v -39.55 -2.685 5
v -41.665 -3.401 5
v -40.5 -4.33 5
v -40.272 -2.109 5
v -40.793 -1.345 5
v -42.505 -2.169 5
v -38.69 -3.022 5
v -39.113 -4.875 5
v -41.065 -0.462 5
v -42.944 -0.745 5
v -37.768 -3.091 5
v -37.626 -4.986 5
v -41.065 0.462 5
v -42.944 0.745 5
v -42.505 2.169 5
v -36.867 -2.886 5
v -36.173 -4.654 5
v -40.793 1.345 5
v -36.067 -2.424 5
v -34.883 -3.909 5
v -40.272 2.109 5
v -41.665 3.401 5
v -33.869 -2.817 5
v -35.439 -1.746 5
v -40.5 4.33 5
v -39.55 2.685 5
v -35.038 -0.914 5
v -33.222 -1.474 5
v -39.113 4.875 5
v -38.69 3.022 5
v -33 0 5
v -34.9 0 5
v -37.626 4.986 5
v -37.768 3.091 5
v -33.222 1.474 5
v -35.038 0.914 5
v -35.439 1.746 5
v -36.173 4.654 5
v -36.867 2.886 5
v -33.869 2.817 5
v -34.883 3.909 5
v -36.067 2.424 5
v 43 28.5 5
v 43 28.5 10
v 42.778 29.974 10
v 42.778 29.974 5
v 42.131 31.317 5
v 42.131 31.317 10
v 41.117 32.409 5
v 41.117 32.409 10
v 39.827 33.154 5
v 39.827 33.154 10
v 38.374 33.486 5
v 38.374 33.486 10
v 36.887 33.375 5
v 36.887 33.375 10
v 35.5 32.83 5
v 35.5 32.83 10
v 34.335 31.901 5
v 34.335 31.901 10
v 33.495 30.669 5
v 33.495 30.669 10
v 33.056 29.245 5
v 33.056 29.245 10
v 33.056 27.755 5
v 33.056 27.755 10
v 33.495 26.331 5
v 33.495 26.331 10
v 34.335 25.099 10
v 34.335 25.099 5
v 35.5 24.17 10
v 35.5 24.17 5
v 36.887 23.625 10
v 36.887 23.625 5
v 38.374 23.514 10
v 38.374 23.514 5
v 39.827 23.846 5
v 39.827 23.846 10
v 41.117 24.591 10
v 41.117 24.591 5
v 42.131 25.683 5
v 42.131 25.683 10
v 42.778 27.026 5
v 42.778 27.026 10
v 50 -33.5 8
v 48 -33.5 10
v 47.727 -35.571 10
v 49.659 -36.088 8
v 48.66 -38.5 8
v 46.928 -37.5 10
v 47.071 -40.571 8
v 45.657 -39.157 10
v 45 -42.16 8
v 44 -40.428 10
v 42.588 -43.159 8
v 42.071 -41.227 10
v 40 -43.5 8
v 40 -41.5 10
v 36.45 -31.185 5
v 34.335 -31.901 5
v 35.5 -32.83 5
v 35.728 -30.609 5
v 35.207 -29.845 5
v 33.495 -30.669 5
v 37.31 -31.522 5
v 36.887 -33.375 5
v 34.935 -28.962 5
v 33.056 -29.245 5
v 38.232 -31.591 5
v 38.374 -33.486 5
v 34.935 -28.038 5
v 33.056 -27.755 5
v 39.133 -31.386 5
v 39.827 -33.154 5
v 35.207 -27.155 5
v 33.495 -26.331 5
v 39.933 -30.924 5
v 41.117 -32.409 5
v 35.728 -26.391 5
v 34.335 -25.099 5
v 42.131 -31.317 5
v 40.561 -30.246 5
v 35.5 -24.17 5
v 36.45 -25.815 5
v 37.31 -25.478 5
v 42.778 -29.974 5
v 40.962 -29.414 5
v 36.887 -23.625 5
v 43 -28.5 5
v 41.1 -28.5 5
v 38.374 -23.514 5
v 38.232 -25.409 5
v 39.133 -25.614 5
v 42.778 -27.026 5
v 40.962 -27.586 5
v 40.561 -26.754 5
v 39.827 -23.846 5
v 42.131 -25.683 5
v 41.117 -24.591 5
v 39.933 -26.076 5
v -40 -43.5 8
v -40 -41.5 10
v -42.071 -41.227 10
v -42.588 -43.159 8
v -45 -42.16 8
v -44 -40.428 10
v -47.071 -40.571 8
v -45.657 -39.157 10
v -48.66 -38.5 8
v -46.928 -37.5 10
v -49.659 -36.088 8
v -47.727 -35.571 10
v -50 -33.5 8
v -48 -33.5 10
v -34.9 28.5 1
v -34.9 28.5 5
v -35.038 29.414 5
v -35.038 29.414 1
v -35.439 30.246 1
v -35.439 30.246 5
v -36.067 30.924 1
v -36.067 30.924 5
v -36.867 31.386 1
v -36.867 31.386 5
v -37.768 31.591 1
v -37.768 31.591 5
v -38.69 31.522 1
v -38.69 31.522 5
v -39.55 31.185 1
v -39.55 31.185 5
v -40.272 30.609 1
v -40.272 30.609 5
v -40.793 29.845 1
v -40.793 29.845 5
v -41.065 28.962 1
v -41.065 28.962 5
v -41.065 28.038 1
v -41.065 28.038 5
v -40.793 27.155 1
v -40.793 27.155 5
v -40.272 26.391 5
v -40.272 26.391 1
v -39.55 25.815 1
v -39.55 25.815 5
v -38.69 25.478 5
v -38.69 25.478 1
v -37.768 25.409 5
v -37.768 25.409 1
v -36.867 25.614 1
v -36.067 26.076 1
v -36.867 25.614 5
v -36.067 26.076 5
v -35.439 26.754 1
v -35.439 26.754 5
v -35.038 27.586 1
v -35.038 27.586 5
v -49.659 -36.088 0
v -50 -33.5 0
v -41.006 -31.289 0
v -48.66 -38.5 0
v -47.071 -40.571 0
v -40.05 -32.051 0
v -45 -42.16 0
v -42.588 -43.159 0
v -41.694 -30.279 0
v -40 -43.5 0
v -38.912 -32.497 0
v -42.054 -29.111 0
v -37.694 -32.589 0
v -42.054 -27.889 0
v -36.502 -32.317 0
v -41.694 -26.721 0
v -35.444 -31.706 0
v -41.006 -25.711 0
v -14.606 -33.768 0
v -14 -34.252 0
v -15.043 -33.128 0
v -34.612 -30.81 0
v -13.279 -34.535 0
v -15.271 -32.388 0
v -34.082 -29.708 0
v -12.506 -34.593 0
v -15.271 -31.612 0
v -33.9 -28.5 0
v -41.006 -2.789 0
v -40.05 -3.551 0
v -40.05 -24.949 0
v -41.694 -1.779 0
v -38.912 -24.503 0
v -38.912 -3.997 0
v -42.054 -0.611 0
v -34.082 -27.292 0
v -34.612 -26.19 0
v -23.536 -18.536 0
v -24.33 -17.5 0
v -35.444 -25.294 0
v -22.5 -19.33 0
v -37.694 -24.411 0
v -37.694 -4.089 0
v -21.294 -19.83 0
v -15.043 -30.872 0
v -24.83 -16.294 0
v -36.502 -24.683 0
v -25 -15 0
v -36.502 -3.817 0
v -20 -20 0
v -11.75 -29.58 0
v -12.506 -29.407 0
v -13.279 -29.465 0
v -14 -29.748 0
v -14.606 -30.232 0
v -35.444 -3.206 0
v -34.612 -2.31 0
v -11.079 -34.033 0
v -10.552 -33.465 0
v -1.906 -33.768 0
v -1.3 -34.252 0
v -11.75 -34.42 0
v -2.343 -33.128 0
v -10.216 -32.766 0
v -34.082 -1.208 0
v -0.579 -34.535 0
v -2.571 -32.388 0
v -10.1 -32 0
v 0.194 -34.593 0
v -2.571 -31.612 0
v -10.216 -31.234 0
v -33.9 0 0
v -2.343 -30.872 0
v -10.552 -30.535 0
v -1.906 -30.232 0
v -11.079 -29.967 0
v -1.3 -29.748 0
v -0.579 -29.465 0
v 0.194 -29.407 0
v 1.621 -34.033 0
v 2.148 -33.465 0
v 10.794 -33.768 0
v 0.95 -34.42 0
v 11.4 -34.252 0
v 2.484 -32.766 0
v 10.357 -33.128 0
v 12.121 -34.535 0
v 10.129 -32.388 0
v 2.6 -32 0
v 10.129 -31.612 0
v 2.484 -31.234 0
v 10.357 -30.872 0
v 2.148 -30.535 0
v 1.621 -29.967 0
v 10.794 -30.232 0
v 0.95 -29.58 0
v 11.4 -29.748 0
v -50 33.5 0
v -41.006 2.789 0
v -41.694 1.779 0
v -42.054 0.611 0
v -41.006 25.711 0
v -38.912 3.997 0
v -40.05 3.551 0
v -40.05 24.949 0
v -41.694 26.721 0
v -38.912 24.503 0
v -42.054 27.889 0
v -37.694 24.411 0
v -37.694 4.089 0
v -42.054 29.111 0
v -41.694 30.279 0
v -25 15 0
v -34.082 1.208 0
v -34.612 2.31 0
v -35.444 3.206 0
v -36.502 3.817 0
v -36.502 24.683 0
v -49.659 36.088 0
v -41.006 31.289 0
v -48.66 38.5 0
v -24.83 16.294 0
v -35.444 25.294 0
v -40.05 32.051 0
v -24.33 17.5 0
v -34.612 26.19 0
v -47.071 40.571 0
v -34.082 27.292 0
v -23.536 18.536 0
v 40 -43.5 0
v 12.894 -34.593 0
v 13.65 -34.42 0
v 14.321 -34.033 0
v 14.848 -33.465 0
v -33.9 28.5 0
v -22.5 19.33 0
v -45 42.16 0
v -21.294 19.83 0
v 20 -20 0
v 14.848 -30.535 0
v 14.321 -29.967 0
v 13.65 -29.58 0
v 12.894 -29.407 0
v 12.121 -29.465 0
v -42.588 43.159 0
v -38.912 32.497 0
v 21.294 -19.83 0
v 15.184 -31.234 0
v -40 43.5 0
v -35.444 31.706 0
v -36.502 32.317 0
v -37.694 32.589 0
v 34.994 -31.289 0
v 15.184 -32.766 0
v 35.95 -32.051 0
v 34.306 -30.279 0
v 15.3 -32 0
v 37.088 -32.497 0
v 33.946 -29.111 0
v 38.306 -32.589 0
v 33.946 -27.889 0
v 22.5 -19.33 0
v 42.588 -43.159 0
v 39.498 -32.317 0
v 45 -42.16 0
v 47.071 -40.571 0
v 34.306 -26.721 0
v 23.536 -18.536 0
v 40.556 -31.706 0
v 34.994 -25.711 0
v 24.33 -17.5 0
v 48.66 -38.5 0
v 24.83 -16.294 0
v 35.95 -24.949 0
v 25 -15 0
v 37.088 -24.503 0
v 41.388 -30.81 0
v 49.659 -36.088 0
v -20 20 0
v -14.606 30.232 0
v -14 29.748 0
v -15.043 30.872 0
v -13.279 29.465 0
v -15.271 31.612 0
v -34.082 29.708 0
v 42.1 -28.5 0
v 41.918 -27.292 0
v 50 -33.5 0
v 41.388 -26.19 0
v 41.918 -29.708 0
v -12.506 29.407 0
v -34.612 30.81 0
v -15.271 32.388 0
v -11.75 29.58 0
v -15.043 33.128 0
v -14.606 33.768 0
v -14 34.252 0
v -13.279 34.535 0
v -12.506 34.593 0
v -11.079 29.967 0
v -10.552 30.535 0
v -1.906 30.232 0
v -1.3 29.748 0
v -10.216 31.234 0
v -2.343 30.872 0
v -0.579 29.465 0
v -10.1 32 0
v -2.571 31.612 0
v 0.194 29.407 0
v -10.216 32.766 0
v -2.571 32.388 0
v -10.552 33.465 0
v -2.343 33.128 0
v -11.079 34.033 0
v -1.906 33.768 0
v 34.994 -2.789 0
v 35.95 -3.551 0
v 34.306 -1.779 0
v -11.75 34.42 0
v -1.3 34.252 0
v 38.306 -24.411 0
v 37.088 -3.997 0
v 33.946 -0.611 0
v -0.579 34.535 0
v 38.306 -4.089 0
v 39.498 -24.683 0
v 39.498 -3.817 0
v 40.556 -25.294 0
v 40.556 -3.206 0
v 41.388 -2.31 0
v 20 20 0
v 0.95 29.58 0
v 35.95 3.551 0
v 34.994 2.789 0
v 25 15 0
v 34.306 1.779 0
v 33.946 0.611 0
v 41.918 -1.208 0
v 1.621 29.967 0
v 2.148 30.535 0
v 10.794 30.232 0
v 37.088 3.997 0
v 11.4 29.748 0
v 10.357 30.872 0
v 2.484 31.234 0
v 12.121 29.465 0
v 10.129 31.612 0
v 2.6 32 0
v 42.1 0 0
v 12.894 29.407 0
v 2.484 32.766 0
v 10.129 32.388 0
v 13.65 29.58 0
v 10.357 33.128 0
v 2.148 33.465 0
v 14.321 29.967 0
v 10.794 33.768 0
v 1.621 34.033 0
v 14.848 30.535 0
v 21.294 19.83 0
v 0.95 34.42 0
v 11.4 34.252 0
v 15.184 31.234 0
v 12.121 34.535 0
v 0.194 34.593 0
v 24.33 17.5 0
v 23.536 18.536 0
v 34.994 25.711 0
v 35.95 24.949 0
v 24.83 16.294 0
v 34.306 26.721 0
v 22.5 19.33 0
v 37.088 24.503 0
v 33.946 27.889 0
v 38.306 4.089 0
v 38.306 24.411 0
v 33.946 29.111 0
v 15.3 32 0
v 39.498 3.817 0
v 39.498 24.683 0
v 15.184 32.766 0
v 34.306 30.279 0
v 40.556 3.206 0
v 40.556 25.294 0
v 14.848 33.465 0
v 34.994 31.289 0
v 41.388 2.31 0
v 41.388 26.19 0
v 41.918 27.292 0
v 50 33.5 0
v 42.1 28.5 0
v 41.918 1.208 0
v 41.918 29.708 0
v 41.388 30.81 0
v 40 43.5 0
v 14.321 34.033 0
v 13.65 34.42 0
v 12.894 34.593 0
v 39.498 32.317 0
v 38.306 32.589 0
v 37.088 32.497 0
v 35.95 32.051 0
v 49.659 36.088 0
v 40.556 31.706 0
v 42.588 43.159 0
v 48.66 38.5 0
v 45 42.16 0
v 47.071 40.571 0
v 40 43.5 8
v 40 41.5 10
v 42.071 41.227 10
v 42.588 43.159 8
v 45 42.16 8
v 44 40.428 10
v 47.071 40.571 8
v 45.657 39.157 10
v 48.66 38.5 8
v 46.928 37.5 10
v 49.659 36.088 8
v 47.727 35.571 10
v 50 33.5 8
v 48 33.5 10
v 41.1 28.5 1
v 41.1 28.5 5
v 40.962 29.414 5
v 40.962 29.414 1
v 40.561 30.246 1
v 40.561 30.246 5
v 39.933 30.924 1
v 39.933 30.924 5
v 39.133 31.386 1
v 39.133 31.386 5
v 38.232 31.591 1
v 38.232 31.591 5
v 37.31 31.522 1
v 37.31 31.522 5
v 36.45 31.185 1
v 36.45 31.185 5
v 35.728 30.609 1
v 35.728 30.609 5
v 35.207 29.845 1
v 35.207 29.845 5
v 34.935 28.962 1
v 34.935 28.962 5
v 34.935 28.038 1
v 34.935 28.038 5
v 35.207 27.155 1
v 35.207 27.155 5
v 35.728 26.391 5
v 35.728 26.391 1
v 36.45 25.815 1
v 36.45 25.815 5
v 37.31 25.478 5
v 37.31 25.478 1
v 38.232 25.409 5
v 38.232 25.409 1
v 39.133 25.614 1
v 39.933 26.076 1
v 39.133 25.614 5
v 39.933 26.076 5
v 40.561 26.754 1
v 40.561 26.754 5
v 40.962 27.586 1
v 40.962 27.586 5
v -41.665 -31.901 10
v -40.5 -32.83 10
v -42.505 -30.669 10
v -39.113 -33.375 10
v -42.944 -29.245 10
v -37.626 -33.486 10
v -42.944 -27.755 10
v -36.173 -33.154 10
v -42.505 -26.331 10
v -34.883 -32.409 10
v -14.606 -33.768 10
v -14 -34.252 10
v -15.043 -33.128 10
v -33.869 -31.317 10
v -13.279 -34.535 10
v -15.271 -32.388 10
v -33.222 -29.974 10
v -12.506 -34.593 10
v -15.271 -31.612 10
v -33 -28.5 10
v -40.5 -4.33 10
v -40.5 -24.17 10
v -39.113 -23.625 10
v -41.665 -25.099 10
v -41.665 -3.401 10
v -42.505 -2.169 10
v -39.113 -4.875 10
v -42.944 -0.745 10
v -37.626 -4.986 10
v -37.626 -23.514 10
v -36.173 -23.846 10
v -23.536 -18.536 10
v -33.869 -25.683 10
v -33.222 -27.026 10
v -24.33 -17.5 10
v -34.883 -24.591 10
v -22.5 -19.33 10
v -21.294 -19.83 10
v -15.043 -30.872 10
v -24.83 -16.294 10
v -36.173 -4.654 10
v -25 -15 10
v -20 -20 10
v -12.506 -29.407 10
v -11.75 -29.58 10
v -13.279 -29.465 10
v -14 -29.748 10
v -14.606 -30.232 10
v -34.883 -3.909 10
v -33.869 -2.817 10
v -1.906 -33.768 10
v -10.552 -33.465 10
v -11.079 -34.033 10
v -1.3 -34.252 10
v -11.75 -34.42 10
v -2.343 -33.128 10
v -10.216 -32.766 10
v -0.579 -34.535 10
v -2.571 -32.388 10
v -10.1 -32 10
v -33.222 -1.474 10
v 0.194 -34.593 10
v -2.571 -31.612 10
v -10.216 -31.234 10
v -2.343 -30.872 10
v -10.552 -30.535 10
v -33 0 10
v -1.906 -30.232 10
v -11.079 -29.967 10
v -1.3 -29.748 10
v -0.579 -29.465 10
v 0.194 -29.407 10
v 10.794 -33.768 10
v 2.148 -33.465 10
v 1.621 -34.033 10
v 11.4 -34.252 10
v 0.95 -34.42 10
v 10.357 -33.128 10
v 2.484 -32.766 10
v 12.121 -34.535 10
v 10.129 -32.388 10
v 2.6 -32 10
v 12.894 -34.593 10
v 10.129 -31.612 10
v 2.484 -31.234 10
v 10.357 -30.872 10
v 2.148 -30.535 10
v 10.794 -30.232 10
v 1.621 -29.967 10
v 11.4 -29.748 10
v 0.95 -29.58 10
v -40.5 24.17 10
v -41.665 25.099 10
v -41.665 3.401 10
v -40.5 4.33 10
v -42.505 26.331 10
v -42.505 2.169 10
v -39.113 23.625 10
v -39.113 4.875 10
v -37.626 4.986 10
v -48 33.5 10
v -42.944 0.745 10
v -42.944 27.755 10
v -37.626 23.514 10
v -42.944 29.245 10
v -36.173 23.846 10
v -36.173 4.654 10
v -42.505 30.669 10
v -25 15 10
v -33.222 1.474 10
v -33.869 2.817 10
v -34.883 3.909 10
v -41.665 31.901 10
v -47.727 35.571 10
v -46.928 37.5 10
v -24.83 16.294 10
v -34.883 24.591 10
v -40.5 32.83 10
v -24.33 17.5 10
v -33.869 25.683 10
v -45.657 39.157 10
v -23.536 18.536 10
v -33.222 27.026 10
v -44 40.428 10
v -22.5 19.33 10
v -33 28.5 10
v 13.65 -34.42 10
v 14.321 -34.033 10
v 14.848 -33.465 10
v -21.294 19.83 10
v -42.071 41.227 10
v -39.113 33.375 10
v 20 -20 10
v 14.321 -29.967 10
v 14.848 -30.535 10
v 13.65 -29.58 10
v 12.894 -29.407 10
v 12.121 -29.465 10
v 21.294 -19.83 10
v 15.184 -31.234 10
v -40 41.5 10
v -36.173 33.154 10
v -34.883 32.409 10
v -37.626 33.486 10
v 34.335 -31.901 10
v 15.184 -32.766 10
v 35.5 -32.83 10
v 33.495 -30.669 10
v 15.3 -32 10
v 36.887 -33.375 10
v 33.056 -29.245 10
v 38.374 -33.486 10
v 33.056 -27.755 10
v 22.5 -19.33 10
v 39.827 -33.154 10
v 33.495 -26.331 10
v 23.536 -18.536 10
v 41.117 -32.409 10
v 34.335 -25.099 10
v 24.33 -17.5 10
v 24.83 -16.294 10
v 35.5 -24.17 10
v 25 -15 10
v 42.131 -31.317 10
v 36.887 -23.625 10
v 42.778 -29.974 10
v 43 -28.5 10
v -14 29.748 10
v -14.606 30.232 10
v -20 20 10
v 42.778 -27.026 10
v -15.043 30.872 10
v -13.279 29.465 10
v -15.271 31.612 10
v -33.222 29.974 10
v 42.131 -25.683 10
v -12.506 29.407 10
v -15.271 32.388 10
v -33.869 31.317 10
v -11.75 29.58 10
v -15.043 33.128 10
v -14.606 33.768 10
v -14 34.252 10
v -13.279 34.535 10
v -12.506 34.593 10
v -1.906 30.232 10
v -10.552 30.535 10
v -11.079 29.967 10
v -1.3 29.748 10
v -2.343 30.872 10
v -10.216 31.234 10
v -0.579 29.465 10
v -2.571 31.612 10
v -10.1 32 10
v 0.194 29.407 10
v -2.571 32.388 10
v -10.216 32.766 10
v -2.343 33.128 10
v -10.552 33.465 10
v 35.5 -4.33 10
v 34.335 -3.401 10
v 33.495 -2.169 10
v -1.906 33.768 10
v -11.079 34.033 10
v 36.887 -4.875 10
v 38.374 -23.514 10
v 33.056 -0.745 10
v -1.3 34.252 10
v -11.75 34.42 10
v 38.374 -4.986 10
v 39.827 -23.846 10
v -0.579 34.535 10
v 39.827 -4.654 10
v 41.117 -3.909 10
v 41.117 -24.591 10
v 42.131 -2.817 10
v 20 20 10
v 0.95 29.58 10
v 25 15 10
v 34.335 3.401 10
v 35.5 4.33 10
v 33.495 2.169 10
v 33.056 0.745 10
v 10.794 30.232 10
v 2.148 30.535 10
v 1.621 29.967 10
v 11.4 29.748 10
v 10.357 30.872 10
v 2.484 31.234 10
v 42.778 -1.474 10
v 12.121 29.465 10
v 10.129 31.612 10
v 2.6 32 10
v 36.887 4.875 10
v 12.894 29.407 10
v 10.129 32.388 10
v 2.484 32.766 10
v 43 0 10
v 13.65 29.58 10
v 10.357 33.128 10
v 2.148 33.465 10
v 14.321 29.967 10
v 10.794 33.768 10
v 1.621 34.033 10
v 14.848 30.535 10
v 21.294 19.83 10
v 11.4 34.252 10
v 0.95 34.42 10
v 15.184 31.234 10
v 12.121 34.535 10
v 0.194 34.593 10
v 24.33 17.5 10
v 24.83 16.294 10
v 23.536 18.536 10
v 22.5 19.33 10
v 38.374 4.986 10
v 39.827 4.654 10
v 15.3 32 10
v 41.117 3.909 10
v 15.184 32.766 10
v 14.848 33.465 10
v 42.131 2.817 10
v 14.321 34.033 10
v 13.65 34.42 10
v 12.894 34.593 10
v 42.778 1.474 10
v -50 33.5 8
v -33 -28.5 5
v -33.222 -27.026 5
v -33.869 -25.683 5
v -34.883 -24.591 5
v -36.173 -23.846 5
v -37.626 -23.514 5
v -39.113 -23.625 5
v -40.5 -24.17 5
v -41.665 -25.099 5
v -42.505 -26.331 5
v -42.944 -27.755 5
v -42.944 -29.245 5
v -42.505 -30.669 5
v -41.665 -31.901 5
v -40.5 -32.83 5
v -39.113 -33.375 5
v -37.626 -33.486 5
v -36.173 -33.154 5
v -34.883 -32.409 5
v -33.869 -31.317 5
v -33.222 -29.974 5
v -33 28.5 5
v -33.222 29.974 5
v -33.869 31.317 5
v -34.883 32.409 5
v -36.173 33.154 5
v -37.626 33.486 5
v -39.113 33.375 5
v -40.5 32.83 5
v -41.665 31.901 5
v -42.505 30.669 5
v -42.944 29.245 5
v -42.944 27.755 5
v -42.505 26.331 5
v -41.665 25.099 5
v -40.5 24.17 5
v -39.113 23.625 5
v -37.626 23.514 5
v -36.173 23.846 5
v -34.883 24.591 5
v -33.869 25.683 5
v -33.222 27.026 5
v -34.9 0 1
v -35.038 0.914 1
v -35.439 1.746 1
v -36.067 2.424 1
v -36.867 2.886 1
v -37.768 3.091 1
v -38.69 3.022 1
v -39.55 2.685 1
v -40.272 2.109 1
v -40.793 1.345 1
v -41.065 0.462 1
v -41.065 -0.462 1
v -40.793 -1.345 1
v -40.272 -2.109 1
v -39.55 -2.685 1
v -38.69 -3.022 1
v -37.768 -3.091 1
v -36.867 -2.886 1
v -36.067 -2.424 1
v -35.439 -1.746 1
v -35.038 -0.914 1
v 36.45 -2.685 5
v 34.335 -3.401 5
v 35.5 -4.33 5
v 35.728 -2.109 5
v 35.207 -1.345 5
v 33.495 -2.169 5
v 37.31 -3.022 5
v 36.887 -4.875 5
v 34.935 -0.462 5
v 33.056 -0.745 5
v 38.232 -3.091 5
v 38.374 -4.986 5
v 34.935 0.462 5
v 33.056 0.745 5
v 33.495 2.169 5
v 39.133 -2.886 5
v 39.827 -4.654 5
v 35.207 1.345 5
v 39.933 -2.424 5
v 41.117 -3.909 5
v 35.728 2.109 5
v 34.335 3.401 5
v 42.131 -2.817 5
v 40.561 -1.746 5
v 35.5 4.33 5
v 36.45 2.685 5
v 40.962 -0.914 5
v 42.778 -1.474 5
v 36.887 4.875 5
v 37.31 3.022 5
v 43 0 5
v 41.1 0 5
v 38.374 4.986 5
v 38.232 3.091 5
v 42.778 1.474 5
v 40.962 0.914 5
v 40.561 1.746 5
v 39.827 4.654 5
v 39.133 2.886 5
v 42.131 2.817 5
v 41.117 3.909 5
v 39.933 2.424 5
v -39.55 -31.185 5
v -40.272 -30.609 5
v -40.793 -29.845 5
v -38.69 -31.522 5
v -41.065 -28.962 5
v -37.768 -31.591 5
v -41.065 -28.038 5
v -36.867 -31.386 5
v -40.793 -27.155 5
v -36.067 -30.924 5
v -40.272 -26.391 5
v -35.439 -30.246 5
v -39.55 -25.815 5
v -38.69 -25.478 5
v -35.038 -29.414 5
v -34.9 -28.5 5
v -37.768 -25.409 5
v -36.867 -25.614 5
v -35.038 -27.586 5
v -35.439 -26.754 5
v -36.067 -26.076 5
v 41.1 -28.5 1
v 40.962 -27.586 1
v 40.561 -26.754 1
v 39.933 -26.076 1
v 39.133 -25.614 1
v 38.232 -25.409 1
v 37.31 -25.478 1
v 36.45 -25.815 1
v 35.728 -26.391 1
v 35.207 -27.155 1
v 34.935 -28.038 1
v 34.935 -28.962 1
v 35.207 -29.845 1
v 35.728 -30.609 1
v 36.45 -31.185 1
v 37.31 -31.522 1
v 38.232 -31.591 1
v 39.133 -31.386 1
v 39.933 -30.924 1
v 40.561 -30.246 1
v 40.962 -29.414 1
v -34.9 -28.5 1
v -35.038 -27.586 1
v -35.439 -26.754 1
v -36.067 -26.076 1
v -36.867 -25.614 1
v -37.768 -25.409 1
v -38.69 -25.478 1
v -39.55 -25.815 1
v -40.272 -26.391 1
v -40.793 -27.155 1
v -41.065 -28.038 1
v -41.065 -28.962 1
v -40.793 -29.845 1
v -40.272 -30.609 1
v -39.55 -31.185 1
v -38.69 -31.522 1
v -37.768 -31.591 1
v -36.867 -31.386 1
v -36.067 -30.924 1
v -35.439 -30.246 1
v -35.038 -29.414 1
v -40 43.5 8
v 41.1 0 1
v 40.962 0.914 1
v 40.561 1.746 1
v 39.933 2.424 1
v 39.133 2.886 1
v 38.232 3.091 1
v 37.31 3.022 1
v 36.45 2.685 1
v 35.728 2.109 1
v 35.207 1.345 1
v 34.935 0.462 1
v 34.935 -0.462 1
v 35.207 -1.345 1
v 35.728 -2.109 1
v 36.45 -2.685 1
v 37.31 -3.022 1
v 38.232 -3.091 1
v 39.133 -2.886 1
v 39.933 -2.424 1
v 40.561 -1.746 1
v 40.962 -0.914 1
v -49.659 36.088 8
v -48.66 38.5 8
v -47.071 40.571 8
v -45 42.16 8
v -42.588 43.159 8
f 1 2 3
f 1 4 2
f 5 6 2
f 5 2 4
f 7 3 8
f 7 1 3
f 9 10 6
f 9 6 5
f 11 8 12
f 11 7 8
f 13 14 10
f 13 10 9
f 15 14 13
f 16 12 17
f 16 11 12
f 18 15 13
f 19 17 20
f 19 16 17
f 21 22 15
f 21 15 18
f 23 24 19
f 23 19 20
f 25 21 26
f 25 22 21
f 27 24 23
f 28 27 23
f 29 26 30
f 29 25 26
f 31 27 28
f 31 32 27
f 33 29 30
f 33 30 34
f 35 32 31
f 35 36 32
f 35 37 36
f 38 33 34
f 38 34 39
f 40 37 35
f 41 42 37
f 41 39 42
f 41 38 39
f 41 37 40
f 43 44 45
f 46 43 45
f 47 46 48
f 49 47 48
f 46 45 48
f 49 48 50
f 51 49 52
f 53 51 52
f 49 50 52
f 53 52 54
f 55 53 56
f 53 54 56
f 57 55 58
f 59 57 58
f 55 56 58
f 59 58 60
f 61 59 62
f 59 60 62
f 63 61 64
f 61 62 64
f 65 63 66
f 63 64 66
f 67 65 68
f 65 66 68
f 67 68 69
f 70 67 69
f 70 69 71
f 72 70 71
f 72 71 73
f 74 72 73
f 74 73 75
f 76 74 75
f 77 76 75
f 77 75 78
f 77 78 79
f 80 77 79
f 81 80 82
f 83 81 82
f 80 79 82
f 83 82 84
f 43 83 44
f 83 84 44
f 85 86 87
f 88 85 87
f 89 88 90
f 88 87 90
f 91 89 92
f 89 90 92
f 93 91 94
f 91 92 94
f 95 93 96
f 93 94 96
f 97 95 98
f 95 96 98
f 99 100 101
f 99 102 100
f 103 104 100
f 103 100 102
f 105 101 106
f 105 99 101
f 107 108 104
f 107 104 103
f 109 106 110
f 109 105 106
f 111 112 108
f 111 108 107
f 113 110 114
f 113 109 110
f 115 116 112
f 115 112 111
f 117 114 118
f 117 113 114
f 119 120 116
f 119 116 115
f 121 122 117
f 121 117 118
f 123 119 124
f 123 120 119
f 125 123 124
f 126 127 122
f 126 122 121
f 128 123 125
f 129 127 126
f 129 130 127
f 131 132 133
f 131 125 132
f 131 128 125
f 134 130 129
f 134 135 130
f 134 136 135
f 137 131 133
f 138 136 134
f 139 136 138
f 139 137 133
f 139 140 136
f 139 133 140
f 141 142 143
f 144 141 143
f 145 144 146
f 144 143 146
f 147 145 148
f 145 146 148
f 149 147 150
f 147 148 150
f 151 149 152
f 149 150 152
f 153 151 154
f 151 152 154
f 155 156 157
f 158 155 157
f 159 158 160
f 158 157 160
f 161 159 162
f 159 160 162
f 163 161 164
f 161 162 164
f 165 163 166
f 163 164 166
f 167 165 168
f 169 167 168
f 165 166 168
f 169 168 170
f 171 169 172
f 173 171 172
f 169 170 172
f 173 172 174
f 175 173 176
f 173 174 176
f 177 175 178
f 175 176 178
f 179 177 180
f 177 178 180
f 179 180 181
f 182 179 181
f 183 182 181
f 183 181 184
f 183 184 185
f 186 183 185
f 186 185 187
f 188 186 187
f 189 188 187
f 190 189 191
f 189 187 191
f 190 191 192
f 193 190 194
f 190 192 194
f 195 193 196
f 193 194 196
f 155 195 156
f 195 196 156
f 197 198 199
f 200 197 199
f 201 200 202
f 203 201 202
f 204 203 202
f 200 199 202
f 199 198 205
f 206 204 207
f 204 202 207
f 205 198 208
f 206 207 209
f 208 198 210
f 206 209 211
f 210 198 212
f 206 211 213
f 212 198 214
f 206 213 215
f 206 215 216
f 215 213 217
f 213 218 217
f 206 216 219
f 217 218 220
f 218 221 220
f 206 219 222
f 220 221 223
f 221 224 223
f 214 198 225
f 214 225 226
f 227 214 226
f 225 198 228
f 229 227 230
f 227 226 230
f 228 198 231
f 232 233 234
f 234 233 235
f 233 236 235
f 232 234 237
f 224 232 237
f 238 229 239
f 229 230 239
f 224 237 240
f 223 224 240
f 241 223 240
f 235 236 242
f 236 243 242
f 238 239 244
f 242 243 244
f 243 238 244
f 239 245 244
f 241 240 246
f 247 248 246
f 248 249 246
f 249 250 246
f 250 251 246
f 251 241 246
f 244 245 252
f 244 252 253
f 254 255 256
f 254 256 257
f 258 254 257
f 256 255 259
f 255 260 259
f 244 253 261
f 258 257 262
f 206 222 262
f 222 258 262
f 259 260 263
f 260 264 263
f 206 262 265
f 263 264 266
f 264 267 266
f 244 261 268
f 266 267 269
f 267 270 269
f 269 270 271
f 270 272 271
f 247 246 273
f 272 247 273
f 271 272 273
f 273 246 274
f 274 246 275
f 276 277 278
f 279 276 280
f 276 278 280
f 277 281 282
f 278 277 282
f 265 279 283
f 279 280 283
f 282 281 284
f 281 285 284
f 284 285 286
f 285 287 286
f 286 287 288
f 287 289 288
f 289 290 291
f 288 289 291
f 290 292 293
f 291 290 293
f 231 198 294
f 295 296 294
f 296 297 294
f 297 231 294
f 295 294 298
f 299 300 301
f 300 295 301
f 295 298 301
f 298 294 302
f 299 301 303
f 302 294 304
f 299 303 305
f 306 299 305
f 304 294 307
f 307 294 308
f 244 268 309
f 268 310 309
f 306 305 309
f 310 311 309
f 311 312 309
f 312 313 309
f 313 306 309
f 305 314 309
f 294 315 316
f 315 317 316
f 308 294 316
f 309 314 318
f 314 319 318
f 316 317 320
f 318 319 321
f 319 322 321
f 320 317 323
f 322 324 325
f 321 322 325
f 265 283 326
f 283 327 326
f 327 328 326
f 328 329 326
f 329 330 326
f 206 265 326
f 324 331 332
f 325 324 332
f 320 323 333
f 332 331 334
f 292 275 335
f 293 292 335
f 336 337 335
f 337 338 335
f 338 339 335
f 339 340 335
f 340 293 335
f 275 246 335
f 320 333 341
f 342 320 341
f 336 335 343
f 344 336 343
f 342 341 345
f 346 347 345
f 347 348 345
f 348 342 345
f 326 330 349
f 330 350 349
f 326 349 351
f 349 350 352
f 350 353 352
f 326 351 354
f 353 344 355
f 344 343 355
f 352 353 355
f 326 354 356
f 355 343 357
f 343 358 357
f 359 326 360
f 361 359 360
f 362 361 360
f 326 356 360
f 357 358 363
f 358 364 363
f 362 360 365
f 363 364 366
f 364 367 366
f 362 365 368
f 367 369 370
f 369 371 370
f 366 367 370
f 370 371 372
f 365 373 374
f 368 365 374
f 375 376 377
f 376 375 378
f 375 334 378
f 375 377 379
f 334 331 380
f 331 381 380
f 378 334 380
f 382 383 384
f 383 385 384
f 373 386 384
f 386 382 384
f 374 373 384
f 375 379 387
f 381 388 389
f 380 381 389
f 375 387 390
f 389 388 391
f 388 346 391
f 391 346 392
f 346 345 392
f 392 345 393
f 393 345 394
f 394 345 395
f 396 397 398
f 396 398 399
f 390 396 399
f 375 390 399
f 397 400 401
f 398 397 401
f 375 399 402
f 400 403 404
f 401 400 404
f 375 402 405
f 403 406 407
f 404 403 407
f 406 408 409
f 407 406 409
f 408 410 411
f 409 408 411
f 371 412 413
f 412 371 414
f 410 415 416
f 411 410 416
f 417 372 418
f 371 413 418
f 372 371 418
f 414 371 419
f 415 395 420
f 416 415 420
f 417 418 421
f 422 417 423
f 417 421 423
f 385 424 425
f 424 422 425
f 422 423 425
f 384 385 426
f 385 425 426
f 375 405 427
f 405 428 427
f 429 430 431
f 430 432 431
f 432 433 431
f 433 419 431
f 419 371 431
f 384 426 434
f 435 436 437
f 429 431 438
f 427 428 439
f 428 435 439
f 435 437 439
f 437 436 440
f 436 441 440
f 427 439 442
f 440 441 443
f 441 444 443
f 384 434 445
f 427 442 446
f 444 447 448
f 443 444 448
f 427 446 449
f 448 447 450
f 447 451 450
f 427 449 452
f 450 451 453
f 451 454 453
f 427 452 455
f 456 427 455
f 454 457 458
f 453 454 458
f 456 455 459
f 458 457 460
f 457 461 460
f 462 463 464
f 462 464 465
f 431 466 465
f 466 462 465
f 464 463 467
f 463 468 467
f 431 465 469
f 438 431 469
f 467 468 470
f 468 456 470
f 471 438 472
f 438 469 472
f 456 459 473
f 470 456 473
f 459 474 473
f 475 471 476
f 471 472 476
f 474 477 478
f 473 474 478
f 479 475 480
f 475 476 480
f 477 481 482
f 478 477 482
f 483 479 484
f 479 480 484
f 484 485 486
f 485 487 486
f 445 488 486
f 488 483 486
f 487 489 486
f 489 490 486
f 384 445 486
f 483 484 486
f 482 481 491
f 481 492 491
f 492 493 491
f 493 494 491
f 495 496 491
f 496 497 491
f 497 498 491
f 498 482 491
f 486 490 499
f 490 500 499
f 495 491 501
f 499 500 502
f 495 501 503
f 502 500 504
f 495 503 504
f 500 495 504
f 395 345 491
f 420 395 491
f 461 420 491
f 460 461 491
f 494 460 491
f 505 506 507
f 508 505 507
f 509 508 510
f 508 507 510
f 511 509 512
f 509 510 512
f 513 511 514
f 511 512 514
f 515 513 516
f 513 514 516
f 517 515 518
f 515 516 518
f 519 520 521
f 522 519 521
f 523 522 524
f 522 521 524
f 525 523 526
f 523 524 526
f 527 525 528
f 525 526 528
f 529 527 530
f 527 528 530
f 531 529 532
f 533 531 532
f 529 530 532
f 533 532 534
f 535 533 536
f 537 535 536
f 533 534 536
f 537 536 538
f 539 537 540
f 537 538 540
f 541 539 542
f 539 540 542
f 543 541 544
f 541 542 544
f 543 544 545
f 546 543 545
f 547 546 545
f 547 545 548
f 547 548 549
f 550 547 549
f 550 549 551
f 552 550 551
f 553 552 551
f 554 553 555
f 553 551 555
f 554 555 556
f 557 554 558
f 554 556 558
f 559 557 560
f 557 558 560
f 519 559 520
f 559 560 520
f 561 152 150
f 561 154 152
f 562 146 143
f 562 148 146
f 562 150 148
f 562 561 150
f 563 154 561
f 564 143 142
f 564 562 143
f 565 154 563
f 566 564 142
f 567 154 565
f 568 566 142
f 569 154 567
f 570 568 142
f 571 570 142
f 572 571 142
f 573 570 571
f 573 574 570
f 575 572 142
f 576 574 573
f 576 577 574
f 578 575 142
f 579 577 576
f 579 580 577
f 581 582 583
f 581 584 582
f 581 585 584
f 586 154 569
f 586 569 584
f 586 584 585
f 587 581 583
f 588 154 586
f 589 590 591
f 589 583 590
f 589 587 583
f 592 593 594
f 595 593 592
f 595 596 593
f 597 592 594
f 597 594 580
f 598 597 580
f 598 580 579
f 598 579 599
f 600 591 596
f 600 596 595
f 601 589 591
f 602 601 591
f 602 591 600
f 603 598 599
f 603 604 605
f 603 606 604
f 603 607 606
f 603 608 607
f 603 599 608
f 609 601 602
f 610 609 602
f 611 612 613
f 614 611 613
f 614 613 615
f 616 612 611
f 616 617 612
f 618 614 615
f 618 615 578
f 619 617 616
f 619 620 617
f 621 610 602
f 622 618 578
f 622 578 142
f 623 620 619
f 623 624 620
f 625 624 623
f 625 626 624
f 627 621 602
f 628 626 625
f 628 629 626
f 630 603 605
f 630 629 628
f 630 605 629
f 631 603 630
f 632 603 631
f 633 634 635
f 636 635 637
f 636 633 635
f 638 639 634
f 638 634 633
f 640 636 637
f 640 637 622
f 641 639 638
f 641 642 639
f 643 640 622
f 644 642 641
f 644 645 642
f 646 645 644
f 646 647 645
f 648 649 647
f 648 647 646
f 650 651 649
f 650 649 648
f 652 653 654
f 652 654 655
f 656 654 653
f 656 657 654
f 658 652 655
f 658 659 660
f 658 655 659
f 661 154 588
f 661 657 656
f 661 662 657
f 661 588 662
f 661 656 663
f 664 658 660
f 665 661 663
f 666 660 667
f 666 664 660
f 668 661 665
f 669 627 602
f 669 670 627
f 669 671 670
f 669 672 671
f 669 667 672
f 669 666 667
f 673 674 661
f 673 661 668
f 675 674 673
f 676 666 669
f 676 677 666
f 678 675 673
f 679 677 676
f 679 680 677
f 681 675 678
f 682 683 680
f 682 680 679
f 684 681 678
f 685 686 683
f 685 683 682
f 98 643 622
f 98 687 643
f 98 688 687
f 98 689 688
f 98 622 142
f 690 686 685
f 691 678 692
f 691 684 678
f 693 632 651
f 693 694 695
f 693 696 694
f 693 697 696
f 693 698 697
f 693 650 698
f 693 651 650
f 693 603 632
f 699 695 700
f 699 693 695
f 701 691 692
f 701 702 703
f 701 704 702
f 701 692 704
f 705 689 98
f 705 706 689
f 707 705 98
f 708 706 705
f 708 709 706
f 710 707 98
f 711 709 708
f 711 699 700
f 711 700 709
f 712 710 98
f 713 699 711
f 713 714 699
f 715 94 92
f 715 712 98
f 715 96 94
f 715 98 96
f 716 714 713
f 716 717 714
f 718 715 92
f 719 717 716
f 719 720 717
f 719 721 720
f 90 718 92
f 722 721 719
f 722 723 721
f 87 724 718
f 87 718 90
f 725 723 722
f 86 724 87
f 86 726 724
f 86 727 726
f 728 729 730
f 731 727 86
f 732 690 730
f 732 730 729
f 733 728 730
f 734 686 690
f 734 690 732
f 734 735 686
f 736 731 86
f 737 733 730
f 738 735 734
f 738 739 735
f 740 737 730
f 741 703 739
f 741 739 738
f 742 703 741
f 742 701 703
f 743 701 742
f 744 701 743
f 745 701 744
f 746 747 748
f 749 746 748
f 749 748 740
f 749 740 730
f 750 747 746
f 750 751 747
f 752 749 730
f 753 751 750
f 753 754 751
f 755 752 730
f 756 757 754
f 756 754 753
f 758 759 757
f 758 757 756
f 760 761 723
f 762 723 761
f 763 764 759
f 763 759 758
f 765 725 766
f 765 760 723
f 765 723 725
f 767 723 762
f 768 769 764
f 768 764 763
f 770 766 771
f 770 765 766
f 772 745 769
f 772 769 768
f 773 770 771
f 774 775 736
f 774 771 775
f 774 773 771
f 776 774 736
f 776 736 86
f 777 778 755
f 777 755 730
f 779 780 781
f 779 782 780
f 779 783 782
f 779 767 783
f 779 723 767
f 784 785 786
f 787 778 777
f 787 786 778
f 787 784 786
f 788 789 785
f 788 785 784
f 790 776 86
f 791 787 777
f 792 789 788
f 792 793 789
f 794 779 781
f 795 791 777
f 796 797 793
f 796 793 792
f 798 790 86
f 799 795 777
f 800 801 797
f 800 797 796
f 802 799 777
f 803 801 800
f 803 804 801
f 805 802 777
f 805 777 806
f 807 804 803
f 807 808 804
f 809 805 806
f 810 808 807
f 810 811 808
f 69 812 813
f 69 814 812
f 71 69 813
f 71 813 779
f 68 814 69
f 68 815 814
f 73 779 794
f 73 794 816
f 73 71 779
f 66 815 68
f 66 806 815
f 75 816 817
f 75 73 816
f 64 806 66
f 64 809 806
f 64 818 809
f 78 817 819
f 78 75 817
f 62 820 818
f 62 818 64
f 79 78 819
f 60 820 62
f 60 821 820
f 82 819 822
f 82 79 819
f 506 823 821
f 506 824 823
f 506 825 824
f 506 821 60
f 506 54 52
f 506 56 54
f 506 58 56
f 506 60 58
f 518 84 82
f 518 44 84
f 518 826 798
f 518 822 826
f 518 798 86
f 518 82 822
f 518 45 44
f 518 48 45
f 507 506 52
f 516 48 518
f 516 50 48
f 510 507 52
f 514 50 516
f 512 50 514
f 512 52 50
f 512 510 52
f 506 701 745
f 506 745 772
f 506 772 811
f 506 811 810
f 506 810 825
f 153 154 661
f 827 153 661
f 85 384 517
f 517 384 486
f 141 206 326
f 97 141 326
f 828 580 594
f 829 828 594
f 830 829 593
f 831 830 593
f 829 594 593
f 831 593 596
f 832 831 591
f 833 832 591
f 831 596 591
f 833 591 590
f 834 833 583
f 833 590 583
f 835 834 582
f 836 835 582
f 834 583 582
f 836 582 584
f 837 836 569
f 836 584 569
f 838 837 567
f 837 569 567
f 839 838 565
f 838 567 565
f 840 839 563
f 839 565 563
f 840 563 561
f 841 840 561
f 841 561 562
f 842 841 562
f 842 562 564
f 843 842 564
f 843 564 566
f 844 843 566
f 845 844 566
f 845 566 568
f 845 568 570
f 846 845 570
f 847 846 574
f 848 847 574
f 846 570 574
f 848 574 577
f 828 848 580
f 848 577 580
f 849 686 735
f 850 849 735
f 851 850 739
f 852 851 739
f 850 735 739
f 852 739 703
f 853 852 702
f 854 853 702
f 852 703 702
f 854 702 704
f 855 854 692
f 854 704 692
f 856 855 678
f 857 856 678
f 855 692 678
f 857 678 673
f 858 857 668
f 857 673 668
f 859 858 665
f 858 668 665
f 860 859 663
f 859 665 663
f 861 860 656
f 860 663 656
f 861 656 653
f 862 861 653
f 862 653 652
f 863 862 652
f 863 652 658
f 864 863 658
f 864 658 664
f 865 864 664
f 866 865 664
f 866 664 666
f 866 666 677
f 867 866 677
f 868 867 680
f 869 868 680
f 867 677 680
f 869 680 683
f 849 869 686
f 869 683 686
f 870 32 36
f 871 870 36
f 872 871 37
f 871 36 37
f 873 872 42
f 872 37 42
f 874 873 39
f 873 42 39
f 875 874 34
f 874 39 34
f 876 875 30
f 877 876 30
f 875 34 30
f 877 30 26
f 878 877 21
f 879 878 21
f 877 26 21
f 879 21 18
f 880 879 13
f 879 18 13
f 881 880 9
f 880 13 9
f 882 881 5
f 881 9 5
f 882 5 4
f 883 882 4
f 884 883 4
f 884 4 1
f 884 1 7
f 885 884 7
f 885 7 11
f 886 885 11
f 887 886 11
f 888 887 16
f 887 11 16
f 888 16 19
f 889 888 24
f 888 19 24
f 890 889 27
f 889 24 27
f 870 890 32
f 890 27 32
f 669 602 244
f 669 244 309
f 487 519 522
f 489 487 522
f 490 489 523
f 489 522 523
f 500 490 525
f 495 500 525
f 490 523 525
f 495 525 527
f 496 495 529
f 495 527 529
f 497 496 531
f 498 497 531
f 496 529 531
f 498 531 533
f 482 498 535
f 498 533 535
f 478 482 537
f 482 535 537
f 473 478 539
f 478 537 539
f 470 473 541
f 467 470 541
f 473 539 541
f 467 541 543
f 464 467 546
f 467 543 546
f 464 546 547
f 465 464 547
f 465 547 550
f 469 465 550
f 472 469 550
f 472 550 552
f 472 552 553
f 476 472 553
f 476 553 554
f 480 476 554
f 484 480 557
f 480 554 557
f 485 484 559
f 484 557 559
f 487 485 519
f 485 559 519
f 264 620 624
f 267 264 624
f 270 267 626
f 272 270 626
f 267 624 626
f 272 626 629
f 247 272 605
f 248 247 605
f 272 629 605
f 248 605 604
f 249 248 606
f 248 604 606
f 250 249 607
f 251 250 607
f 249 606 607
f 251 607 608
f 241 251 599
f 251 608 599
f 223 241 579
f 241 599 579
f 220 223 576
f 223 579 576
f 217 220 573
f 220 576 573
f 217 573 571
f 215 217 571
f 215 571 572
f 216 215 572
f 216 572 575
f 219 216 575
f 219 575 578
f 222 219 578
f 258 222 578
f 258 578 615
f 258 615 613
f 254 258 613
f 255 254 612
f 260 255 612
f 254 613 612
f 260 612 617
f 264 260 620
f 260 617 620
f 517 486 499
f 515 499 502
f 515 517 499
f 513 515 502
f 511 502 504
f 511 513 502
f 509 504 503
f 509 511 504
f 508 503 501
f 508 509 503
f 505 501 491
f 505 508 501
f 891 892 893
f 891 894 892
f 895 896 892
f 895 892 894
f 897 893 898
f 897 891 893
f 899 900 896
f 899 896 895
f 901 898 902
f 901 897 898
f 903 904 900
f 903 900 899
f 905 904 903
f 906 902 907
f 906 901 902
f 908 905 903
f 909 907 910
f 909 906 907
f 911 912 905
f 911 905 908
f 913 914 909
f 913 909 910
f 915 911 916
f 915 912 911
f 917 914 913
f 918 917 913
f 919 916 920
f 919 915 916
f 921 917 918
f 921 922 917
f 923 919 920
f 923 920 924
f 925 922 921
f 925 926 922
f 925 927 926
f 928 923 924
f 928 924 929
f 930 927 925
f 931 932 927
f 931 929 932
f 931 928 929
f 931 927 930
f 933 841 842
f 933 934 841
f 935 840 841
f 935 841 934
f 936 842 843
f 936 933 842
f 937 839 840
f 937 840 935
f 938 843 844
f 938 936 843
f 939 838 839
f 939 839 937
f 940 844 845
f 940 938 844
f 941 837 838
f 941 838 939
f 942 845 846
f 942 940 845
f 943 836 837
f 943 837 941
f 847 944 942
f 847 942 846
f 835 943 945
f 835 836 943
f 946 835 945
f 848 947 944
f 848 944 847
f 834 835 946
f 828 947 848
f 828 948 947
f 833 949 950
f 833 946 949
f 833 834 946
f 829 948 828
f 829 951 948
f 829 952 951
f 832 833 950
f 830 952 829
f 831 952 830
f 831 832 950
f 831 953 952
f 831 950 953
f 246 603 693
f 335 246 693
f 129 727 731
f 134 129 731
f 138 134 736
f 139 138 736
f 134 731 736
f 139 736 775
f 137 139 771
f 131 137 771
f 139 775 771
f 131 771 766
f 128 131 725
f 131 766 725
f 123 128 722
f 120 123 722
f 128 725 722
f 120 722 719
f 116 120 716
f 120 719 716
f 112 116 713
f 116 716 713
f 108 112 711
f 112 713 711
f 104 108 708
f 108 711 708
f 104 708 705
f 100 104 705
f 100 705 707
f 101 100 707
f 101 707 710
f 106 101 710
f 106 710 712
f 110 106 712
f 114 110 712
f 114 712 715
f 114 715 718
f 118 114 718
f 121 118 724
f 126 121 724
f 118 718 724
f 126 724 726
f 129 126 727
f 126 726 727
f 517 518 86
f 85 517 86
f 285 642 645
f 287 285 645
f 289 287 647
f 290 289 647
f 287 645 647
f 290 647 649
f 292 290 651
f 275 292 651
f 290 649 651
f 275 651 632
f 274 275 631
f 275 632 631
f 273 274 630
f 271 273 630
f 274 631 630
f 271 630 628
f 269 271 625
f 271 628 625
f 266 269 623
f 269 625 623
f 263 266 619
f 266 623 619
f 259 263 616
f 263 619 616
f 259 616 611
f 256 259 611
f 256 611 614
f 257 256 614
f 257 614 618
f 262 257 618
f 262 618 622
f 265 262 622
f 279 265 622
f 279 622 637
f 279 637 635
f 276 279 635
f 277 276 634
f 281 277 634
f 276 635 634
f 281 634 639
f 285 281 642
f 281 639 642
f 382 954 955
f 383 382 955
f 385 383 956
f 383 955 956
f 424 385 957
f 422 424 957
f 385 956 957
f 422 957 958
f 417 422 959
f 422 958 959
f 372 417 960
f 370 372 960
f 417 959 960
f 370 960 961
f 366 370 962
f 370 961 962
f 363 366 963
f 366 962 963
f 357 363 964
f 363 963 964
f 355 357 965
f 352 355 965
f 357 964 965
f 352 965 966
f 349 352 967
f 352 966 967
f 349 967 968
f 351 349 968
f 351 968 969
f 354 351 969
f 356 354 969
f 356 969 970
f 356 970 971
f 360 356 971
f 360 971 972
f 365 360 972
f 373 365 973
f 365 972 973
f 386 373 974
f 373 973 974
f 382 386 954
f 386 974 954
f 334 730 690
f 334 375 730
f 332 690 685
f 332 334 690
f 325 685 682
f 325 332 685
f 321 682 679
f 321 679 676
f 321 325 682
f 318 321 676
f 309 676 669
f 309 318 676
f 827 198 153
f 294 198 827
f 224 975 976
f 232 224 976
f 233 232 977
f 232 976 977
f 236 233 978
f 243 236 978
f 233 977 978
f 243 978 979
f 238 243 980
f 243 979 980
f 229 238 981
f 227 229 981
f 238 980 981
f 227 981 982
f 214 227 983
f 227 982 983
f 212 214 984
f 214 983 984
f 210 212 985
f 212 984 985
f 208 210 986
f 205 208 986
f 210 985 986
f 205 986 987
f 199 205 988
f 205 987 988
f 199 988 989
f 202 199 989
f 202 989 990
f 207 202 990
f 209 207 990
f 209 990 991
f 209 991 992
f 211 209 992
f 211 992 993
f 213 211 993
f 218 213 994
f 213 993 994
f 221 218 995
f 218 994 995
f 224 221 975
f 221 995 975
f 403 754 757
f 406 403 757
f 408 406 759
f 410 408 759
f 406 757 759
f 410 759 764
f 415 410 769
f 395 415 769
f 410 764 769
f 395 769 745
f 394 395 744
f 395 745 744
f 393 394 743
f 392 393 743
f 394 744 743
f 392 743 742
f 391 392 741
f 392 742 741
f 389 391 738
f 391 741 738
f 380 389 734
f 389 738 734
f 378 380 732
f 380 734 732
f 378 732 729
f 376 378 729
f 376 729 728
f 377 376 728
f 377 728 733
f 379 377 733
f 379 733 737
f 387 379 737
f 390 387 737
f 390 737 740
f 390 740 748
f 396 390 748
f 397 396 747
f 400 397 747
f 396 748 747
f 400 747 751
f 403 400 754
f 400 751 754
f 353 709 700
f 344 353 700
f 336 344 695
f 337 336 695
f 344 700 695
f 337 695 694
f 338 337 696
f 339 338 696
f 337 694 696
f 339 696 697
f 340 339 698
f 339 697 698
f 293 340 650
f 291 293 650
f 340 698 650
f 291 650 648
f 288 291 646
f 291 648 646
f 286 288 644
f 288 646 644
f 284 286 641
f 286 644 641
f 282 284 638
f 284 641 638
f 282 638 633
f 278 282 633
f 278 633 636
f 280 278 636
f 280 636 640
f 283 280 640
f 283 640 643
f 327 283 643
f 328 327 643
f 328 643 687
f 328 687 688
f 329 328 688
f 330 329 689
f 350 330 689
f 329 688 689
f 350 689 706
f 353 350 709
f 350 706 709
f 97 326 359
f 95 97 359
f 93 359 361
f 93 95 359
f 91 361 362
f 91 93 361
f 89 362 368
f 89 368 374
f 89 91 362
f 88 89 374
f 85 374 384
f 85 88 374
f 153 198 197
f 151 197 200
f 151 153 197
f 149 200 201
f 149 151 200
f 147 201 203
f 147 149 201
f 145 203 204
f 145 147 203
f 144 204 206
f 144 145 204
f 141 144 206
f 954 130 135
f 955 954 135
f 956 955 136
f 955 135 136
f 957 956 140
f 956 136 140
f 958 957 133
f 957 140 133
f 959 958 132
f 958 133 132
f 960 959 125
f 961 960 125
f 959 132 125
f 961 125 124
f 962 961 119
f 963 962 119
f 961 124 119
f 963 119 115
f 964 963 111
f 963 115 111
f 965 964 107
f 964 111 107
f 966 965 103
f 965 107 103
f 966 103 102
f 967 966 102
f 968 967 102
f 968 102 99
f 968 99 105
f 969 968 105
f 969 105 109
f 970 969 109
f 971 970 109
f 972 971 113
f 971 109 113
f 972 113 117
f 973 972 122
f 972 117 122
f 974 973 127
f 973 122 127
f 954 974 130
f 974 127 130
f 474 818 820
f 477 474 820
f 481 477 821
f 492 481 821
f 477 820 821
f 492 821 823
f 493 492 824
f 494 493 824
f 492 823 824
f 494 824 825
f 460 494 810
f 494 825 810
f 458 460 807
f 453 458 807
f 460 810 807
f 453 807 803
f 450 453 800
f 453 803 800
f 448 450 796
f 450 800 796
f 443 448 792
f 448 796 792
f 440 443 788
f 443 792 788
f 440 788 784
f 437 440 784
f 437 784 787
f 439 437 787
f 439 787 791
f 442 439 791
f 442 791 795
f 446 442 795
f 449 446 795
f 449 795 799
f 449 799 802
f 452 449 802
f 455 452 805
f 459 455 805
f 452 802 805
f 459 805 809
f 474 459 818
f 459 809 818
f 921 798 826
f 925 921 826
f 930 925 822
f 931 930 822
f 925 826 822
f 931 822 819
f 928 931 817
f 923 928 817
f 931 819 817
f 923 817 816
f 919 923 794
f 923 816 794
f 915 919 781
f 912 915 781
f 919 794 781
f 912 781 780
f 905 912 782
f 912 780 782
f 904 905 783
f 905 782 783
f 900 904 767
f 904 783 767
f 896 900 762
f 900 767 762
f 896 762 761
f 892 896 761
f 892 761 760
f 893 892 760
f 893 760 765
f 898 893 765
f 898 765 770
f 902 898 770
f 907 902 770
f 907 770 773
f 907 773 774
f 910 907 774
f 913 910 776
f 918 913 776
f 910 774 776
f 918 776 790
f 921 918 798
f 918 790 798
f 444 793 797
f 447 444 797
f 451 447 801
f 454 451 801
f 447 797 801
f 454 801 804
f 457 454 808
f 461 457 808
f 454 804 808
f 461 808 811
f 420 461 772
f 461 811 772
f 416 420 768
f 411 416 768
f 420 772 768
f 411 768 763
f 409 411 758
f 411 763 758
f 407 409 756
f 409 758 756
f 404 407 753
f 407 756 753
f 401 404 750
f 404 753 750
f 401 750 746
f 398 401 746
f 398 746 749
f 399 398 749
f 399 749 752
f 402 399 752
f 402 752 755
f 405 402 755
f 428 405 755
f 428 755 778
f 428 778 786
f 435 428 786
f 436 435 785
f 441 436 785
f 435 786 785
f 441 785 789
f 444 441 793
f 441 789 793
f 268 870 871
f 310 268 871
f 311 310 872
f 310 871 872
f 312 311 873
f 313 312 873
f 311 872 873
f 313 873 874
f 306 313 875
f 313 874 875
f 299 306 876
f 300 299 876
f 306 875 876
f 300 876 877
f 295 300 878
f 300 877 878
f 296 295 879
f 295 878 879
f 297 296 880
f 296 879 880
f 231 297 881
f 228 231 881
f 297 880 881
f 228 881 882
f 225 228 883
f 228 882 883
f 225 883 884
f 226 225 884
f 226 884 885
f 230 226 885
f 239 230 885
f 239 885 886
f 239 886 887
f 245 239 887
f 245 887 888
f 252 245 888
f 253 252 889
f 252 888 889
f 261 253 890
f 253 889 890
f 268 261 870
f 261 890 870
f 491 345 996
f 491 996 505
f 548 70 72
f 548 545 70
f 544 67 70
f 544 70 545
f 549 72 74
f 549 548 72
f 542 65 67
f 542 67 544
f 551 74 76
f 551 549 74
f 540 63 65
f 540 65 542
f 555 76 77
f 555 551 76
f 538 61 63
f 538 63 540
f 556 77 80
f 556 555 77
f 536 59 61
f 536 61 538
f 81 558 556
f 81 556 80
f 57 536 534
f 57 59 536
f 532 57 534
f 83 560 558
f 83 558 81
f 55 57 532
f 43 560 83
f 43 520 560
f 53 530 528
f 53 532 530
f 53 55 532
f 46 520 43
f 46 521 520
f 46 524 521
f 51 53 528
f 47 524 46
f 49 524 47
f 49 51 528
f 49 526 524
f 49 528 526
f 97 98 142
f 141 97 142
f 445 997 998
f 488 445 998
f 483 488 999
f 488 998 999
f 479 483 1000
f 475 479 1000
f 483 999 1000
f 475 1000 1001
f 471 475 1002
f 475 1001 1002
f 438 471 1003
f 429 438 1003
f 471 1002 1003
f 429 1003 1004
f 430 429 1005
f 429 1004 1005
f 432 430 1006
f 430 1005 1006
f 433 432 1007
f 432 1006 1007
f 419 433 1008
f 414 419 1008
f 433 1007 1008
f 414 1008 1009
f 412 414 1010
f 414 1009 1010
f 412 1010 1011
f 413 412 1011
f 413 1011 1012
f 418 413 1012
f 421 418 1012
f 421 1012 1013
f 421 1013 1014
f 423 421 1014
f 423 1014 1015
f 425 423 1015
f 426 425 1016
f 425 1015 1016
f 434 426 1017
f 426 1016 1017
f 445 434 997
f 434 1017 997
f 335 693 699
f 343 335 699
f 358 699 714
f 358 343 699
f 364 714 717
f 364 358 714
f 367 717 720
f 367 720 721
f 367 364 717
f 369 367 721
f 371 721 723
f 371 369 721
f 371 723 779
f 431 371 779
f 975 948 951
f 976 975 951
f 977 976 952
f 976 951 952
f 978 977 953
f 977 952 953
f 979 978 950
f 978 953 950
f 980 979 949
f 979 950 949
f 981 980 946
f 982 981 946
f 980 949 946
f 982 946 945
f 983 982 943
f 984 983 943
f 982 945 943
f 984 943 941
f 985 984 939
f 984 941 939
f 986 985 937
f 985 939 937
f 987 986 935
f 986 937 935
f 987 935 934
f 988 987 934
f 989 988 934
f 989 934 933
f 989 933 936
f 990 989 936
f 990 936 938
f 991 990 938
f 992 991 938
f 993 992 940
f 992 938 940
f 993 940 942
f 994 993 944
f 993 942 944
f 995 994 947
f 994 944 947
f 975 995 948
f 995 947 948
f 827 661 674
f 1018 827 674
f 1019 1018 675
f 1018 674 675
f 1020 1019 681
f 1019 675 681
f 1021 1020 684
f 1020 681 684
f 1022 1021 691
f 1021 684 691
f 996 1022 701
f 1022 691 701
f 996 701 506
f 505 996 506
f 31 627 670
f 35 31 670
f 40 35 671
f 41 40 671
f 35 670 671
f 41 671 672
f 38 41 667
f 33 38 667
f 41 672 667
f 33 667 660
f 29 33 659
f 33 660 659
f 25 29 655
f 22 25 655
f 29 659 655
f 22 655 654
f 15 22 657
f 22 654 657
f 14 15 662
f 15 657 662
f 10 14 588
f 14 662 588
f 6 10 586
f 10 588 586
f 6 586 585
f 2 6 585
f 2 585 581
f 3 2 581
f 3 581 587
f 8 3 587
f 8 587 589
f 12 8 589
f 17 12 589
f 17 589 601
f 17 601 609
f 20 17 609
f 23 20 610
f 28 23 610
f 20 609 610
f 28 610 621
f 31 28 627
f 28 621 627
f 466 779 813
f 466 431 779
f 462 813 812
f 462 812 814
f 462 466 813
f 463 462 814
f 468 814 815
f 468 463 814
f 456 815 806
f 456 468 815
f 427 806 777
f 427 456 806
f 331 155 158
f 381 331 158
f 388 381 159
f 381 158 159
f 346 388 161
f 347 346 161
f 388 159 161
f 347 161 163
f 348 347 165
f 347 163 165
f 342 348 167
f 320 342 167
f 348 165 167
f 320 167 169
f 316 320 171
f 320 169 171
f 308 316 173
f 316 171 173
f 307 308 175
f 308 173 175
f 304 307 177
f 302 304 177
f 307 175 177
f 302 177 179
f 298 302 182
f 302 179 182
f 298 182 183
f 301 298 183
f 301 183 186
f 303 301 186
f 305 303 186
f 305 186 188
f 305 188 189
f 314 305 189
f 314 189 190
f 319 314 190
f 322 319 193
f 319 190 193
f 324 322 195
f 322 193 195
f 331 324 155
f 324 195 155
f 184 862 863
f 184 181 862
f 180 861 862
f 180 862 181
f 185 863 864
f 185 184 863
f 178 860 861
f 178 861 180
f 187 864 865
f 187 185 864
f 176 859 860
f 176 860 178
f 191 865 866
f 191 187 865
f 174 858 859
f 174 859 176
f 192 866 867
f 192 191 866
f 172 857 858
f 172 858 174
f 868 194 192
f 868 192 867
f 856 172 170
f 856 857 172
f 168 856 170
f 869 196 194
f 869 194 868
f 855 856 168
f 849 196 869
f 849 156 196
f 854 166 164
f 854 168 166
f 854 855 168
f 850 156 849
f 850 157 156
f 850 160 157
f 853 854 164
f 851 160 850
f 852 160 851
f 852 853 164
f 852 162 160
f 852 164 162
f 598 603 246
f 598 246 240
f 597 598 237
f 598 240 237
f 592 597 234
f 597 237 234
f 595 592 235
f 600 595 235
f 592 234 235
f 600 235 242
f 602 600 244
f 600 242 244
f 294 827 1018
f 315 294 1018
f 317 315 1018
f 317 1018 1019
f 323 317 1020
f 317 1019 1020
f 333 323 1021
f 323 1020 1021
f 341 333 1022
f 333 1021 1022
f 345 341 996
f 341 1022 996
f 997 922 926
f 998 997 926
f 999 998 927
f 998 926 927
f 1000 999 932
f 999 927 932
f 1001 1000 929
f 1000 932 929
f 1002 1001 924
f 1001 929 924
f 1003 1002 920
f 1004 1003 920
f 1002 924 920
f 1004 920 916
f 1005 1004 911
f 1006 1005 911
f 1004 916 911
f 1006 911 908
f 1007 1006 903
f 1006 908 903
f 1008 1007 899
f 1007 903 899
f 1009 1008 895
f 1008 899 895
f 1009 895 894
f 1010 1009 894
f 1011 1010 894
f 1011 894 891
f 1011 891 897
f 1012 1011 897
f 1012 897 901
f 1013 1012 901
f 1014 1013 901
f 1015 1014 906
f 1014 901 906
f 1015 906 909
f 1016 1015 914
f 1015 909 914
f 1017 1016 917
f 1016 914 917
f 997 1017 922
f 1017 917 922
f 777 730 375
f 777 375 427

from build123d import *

# Parameters (mm, degrees)
SKETCH_1_W          = 100
SKETCH_1_H          = 87
EXTRUDE_1_DEPTH     = 10
FILLET_1_R          = 10
SKETCH_2_R          = 2.6
CUT_EXTRUDE_1_DEPTH = 10
SKETCH_3_R          = 5
CUT_EXTRUDE_2_DEPTH = 5
SKETCH_4_R          = 3.1
CUT_EXTRUDE_3_DEPTH = 5
CHAMFER_1_SIZE      = 1
CHAMFER_2_SIZE      = 2
SKETCH1_W           = 50
SKETCH1_H           = 40
CUT_EXTRUDE1_DEPTH  = 10
FILLET1_R           = 5


with BuildPart() as part:
    # 草图1 → 凸台-拉伸1 (new body)
    with BuildSketch(Plane.XY):
        Rectangle(SKETCH_1_W, SKETCH_1_H)
    extrude(amount=EXTRUDE_1_DEPTH)

    # 圆角1
    fillet_1_edges = [part.edges().sort_by_distance(p)[0] for p in [
        (50, -43.5, 5),
        (-50, -43.5, 5),
        (-50, 43.5, 5),
        (50, 43.5, 5),
    ]]
    fillet(fillet_1_edges, radius=FILLET_1_R)

    # 草图2 → 切除-拉伸1 (cut)
    with BuildSketch(Plane.XY.offset(10)):
        with Locations((0, 32)):
            Circle(SKETCH_2_R)
        with Locations((-12.7, 32)):
            Circle(SKETCH_2_R)
        with Locations((12.7, 32)):
            Circle(SKETCH_2_R)
        with Locations((-12.7, -32)):
            Circle(SKETCH_2_R)
        with Locations((0, -32)):
            Circle(SKETCH_2_R)
        with Locations((12.7, -32)):
            Circle(SKETCH_2_R)
    extrude(amount=-CUT_EXTRUDE_1_DEPTH, mode=Mode.SUBTRACT)

    # 草图3 → 切除-拉伸2 (cut)
    with BuildSketch(Plane.XY.offset(10)):
        with Locations((-38, 28.5)):
            Circle(SKETCH_3_R)
        with Locations((-38, 0)):
            Circle(SKETCH_3_R)
        with Locations((-38, -28.5)):
            Circle(SKETCH_3_R)
        with Locations((38, -28.5)):
            Circle(SKETCH_3_R)
        with Locations((38, 0)):
            Circle(SKETCH_3_R)
        with Locations((38, 28.5)):
            Circle(SKETCH_3_R)
    extrude(amount=-CUT_EXTRUDE_2_DEPTH, mode=Mode.SUBTRACT)

    # 草图4 → 切除-拉伸3 (cut)
    with BuildSketch(Plane.XY.offset(5)):
        with Locations((-38, 28.5)):
            Circle(SKETCH_4_R)
        with Locations((-38, 0)):
            Circle(SKETCH_4_R)
        with Locations((-38, -28.5)):
            Circle(SKETCH_4_R)
        with Locations((38, 28.5)):
            Circle(SKETCH_4_R)
        with Locations((38, 0)):
            Circle(SKETCH_4_R)
        with Locations((38, -28.5)):
            Circle(SKETCH_4_R)
    extrude(amount=-CUT_EXTRUDE_3_DEPTH, mode=Mode.SUBTRACT)

    # 倒角1
    chamfer_1_edges = [part.edges().sort_by_distance(p)[0] for p in [
        (34.9, 0, 0),
        (34.9, -28.5, 0),
        (-41.1, 28.5, 0),
        (-41.1, 0, 0),
        (-41.1, -28.5, 0),
        (34.9, 28.5, 0),
    ]]
    chamfer(chamfer_1_edges, length=CHAMFER_1_SIZE)

    # 倒角2
    chamfer_2_edges = [part.edges().sort_by_distance(p)[0] for p in [
        (0, 43.5, 10),
        (50, 0, 10),
        (-50, 0, 10),
        (0, -43.5, 10),
        (-47.071067812, -40.571067812, 10),
        (47.071067812, -40.571067812, 10),
        (-47.071067812, 40.571067812, 10),
        (47.071067812, 40.571067812, 10),
    ]]
    chamfer(chamfer_2_edges, length=CHAMFER_2_SIZE)

    # Sketch1 → Cut-Extrude1 (cut)
    with BuildSketch(Plane.XY.offset(10)):
        Rectangle(SKETCH1_W, SKETCH1_H)
    extrude(amount=-CUT_EXTRUDE1_DEPTH, mode=Mode.SUBTRACT)

    # Fillet1
    fillet1_edges = [part.edges().sort_by_distance(p)[0] for p in [
        (25, 20, 5),
        (25, -20, 5),
        (-25, -20, 5),
        (-25, 20, 5),
    ]]
    fillet(fillet1_edges, radius=FILLET1_R)


solid = part.part
